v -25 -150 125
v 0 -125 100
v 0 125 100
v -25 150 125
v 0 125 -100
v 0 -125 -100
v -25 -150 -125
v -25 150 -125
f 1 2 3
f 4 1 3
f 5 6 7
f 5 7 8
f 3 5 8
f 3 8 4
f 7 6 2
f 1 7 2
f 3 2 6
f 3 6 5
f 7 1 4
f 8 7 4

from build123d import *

# Parameters (mm, degrees)
F0_W     = 300
F0_H     = 250
F1_DEPTH = 25
F2_SIZE  = 24.99999


# Not quite as in the source:
# - a fillet or chamfer is up to 0.001 mm smaller than in the source, because OpenCascade refuses the exact size


with BuildPart() as f1:
    # F0 (on Right) → F1 (new body)
    with BuildSketch(Plane.YZ):
        Rectangle(F0_W, F0_H)
    extrude(amount=-F1_DEPTH)

    # F2 (size 25 in the source; OpenCascade refuses exactly that, so slightly less here)
    f2_edges = [f1.edges().sort_by_distance(p)[0] for p in [
        (0, 0, 125),
        (0, -150, 0),
        (0, 0, -125),
        (0, 150, 0),
    ]]
    chamfer(f2_edges, length=F2_SIZE)


solid = f1.part
